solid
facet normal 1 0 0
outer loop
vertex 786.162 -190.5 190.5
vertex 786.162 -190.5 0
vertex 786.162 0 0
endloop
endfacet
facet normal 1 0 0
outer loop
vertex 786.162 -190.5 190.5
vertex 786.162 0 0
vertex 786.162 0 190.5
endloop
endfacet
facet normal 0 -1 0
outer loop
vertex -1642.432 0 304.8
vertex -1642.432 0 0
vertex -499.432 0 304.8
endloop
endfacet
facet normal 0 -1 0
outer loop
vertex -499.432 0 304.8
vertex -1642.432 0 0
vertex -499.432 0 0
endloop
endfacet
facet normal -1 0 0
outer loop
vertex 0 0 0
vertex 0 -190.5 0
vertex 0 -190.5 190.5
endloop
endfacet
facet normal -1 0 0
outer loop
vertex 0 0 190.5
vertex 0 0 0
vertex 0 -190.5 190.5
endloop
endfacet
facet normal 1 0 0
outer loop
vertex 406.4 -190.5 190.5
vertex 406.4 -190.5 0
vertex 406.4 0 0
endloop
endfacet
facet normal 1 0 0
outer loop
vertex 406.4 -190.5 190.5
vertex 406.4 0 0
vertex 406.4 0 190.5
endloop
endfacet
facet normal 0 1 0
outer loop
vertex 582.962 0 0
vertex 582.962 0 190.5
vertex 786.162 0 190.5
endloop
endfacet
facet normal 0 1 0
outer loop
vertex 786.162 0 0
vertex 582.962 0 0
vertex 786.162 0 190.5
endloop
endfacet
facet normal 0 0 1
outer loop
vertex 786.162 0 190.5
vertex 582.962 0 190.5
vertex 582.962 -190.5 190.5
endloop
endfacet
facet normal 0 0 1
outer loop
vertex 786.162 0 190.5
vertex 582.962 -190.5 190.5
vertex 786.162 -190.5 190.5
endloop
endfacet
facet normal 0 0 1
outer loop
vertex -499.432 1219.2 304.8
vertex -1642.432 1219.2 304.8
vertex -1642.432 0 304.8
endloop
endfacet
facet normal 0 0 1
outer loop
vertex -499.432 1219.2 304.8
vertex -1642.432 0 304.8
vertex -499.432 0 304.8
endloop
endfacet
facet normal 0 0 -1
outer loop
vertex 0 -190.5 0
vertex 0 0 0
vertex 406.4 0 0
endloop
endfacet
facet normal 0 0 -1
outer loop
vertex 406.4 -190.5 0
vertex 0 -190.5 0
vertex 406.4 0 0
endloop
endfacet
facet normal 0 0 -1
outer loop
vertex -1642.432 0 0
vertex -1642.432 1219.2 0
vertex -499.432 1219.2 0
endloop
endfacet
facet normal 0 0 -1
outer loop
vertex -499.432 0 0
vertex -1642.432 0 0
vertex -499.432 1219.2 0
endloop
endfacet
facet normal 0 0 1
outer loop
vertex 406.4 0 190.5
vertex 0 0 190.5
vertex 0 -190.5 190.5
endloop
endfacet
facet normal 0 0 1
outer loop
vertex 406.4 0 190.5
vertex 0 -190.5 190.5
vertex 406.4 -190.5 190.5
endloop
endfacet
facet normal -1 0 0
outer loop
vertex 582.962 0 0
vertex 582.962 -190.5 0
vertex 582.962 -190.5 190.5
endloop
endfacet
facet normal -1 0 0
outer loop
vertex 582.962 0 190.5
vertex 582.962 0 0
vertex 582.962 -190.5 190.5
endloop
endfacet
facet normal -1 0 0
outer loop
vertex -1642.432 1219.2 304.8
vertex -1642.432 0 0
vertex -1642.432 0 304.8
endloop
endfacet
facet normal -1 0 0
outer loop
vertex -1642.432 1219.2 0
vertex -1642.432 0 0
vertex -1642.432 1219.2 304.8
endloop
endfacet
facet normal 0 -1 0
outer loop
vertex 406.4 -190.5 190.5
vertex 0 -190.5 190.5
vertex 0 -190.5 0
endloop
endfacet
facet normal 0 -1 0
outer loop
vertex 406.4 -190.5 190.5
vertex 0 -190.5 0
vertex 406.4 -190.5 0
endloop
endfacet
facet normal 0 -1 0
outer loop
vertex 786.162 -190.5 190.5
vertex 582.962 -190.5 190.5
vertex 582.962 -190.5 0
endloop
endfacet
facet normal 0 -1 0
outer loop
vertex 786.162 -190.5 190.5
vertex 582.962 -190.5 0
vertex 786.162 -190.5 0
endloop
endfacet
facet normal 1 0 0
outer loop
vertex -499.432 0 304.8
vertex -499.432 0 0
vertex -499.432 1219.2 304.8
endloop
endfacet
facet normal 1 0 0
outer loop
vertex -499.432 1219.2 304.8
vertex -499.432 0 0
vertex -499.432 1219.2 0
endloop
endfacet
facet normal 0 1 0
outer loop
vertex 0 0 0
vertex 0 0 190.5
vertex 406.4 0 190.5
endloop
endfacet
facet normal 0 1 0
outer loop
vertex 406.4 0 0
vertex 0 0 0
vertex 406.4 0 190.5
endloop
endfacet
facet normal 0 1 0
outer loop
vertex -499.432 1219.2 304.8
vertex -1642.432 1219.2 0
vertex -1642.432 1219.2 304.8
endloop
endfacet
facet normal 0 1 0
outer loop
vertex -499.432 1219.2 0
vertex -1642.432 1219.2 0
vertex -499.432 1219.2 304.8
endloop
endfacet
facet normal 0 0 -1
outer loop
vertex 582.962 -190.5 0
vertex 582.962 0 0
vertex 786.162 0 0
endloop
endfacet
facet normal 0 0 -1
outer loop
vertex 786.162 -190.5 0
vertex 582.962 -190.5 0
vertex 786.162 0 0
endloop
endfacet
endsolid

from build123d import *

# Parameters (mm, degrees)
F0_W     = 406.4
F0_H     = 190.5
F1_DEPTH = 190.5
F2_W     = 203.2
F2_H     = 190.5
F3_DEPTH = 190.5
F4_W     = 1143
F4_H     = 1219.2
F5_DEPTH = 304.8


with BuildPart() as f1:
    # F0 (on Front) → F1 (new body)
    with BuildSketch(Plane.XZ):
        with Locations((203.2, 95.25)):
            Rectangle(F0_W, F0_H)
    extrude(amount=F1_DEPTH)


with BuildPart() as f3:
    # F2 (on Front) → F3 (new body)
    with BuildSketch(Plane.XZ):
        with Locations((684.562398, 95.25)):
            Rectangle(F2_W, F2_H)
    extrude(amount=F3_DEPTH)


with BuildPart() as f5:
    # F4 (on Top) → F5 (new body)
    with BuildSketch(Plane.XY):
        with Locations((-1070.932314, 609.6)):
            Rectangle(F4_W, F4_H)
    extrude(amount=F5_DEPTH)


solid = Compound([f1.part, f3.part, f5.part])
